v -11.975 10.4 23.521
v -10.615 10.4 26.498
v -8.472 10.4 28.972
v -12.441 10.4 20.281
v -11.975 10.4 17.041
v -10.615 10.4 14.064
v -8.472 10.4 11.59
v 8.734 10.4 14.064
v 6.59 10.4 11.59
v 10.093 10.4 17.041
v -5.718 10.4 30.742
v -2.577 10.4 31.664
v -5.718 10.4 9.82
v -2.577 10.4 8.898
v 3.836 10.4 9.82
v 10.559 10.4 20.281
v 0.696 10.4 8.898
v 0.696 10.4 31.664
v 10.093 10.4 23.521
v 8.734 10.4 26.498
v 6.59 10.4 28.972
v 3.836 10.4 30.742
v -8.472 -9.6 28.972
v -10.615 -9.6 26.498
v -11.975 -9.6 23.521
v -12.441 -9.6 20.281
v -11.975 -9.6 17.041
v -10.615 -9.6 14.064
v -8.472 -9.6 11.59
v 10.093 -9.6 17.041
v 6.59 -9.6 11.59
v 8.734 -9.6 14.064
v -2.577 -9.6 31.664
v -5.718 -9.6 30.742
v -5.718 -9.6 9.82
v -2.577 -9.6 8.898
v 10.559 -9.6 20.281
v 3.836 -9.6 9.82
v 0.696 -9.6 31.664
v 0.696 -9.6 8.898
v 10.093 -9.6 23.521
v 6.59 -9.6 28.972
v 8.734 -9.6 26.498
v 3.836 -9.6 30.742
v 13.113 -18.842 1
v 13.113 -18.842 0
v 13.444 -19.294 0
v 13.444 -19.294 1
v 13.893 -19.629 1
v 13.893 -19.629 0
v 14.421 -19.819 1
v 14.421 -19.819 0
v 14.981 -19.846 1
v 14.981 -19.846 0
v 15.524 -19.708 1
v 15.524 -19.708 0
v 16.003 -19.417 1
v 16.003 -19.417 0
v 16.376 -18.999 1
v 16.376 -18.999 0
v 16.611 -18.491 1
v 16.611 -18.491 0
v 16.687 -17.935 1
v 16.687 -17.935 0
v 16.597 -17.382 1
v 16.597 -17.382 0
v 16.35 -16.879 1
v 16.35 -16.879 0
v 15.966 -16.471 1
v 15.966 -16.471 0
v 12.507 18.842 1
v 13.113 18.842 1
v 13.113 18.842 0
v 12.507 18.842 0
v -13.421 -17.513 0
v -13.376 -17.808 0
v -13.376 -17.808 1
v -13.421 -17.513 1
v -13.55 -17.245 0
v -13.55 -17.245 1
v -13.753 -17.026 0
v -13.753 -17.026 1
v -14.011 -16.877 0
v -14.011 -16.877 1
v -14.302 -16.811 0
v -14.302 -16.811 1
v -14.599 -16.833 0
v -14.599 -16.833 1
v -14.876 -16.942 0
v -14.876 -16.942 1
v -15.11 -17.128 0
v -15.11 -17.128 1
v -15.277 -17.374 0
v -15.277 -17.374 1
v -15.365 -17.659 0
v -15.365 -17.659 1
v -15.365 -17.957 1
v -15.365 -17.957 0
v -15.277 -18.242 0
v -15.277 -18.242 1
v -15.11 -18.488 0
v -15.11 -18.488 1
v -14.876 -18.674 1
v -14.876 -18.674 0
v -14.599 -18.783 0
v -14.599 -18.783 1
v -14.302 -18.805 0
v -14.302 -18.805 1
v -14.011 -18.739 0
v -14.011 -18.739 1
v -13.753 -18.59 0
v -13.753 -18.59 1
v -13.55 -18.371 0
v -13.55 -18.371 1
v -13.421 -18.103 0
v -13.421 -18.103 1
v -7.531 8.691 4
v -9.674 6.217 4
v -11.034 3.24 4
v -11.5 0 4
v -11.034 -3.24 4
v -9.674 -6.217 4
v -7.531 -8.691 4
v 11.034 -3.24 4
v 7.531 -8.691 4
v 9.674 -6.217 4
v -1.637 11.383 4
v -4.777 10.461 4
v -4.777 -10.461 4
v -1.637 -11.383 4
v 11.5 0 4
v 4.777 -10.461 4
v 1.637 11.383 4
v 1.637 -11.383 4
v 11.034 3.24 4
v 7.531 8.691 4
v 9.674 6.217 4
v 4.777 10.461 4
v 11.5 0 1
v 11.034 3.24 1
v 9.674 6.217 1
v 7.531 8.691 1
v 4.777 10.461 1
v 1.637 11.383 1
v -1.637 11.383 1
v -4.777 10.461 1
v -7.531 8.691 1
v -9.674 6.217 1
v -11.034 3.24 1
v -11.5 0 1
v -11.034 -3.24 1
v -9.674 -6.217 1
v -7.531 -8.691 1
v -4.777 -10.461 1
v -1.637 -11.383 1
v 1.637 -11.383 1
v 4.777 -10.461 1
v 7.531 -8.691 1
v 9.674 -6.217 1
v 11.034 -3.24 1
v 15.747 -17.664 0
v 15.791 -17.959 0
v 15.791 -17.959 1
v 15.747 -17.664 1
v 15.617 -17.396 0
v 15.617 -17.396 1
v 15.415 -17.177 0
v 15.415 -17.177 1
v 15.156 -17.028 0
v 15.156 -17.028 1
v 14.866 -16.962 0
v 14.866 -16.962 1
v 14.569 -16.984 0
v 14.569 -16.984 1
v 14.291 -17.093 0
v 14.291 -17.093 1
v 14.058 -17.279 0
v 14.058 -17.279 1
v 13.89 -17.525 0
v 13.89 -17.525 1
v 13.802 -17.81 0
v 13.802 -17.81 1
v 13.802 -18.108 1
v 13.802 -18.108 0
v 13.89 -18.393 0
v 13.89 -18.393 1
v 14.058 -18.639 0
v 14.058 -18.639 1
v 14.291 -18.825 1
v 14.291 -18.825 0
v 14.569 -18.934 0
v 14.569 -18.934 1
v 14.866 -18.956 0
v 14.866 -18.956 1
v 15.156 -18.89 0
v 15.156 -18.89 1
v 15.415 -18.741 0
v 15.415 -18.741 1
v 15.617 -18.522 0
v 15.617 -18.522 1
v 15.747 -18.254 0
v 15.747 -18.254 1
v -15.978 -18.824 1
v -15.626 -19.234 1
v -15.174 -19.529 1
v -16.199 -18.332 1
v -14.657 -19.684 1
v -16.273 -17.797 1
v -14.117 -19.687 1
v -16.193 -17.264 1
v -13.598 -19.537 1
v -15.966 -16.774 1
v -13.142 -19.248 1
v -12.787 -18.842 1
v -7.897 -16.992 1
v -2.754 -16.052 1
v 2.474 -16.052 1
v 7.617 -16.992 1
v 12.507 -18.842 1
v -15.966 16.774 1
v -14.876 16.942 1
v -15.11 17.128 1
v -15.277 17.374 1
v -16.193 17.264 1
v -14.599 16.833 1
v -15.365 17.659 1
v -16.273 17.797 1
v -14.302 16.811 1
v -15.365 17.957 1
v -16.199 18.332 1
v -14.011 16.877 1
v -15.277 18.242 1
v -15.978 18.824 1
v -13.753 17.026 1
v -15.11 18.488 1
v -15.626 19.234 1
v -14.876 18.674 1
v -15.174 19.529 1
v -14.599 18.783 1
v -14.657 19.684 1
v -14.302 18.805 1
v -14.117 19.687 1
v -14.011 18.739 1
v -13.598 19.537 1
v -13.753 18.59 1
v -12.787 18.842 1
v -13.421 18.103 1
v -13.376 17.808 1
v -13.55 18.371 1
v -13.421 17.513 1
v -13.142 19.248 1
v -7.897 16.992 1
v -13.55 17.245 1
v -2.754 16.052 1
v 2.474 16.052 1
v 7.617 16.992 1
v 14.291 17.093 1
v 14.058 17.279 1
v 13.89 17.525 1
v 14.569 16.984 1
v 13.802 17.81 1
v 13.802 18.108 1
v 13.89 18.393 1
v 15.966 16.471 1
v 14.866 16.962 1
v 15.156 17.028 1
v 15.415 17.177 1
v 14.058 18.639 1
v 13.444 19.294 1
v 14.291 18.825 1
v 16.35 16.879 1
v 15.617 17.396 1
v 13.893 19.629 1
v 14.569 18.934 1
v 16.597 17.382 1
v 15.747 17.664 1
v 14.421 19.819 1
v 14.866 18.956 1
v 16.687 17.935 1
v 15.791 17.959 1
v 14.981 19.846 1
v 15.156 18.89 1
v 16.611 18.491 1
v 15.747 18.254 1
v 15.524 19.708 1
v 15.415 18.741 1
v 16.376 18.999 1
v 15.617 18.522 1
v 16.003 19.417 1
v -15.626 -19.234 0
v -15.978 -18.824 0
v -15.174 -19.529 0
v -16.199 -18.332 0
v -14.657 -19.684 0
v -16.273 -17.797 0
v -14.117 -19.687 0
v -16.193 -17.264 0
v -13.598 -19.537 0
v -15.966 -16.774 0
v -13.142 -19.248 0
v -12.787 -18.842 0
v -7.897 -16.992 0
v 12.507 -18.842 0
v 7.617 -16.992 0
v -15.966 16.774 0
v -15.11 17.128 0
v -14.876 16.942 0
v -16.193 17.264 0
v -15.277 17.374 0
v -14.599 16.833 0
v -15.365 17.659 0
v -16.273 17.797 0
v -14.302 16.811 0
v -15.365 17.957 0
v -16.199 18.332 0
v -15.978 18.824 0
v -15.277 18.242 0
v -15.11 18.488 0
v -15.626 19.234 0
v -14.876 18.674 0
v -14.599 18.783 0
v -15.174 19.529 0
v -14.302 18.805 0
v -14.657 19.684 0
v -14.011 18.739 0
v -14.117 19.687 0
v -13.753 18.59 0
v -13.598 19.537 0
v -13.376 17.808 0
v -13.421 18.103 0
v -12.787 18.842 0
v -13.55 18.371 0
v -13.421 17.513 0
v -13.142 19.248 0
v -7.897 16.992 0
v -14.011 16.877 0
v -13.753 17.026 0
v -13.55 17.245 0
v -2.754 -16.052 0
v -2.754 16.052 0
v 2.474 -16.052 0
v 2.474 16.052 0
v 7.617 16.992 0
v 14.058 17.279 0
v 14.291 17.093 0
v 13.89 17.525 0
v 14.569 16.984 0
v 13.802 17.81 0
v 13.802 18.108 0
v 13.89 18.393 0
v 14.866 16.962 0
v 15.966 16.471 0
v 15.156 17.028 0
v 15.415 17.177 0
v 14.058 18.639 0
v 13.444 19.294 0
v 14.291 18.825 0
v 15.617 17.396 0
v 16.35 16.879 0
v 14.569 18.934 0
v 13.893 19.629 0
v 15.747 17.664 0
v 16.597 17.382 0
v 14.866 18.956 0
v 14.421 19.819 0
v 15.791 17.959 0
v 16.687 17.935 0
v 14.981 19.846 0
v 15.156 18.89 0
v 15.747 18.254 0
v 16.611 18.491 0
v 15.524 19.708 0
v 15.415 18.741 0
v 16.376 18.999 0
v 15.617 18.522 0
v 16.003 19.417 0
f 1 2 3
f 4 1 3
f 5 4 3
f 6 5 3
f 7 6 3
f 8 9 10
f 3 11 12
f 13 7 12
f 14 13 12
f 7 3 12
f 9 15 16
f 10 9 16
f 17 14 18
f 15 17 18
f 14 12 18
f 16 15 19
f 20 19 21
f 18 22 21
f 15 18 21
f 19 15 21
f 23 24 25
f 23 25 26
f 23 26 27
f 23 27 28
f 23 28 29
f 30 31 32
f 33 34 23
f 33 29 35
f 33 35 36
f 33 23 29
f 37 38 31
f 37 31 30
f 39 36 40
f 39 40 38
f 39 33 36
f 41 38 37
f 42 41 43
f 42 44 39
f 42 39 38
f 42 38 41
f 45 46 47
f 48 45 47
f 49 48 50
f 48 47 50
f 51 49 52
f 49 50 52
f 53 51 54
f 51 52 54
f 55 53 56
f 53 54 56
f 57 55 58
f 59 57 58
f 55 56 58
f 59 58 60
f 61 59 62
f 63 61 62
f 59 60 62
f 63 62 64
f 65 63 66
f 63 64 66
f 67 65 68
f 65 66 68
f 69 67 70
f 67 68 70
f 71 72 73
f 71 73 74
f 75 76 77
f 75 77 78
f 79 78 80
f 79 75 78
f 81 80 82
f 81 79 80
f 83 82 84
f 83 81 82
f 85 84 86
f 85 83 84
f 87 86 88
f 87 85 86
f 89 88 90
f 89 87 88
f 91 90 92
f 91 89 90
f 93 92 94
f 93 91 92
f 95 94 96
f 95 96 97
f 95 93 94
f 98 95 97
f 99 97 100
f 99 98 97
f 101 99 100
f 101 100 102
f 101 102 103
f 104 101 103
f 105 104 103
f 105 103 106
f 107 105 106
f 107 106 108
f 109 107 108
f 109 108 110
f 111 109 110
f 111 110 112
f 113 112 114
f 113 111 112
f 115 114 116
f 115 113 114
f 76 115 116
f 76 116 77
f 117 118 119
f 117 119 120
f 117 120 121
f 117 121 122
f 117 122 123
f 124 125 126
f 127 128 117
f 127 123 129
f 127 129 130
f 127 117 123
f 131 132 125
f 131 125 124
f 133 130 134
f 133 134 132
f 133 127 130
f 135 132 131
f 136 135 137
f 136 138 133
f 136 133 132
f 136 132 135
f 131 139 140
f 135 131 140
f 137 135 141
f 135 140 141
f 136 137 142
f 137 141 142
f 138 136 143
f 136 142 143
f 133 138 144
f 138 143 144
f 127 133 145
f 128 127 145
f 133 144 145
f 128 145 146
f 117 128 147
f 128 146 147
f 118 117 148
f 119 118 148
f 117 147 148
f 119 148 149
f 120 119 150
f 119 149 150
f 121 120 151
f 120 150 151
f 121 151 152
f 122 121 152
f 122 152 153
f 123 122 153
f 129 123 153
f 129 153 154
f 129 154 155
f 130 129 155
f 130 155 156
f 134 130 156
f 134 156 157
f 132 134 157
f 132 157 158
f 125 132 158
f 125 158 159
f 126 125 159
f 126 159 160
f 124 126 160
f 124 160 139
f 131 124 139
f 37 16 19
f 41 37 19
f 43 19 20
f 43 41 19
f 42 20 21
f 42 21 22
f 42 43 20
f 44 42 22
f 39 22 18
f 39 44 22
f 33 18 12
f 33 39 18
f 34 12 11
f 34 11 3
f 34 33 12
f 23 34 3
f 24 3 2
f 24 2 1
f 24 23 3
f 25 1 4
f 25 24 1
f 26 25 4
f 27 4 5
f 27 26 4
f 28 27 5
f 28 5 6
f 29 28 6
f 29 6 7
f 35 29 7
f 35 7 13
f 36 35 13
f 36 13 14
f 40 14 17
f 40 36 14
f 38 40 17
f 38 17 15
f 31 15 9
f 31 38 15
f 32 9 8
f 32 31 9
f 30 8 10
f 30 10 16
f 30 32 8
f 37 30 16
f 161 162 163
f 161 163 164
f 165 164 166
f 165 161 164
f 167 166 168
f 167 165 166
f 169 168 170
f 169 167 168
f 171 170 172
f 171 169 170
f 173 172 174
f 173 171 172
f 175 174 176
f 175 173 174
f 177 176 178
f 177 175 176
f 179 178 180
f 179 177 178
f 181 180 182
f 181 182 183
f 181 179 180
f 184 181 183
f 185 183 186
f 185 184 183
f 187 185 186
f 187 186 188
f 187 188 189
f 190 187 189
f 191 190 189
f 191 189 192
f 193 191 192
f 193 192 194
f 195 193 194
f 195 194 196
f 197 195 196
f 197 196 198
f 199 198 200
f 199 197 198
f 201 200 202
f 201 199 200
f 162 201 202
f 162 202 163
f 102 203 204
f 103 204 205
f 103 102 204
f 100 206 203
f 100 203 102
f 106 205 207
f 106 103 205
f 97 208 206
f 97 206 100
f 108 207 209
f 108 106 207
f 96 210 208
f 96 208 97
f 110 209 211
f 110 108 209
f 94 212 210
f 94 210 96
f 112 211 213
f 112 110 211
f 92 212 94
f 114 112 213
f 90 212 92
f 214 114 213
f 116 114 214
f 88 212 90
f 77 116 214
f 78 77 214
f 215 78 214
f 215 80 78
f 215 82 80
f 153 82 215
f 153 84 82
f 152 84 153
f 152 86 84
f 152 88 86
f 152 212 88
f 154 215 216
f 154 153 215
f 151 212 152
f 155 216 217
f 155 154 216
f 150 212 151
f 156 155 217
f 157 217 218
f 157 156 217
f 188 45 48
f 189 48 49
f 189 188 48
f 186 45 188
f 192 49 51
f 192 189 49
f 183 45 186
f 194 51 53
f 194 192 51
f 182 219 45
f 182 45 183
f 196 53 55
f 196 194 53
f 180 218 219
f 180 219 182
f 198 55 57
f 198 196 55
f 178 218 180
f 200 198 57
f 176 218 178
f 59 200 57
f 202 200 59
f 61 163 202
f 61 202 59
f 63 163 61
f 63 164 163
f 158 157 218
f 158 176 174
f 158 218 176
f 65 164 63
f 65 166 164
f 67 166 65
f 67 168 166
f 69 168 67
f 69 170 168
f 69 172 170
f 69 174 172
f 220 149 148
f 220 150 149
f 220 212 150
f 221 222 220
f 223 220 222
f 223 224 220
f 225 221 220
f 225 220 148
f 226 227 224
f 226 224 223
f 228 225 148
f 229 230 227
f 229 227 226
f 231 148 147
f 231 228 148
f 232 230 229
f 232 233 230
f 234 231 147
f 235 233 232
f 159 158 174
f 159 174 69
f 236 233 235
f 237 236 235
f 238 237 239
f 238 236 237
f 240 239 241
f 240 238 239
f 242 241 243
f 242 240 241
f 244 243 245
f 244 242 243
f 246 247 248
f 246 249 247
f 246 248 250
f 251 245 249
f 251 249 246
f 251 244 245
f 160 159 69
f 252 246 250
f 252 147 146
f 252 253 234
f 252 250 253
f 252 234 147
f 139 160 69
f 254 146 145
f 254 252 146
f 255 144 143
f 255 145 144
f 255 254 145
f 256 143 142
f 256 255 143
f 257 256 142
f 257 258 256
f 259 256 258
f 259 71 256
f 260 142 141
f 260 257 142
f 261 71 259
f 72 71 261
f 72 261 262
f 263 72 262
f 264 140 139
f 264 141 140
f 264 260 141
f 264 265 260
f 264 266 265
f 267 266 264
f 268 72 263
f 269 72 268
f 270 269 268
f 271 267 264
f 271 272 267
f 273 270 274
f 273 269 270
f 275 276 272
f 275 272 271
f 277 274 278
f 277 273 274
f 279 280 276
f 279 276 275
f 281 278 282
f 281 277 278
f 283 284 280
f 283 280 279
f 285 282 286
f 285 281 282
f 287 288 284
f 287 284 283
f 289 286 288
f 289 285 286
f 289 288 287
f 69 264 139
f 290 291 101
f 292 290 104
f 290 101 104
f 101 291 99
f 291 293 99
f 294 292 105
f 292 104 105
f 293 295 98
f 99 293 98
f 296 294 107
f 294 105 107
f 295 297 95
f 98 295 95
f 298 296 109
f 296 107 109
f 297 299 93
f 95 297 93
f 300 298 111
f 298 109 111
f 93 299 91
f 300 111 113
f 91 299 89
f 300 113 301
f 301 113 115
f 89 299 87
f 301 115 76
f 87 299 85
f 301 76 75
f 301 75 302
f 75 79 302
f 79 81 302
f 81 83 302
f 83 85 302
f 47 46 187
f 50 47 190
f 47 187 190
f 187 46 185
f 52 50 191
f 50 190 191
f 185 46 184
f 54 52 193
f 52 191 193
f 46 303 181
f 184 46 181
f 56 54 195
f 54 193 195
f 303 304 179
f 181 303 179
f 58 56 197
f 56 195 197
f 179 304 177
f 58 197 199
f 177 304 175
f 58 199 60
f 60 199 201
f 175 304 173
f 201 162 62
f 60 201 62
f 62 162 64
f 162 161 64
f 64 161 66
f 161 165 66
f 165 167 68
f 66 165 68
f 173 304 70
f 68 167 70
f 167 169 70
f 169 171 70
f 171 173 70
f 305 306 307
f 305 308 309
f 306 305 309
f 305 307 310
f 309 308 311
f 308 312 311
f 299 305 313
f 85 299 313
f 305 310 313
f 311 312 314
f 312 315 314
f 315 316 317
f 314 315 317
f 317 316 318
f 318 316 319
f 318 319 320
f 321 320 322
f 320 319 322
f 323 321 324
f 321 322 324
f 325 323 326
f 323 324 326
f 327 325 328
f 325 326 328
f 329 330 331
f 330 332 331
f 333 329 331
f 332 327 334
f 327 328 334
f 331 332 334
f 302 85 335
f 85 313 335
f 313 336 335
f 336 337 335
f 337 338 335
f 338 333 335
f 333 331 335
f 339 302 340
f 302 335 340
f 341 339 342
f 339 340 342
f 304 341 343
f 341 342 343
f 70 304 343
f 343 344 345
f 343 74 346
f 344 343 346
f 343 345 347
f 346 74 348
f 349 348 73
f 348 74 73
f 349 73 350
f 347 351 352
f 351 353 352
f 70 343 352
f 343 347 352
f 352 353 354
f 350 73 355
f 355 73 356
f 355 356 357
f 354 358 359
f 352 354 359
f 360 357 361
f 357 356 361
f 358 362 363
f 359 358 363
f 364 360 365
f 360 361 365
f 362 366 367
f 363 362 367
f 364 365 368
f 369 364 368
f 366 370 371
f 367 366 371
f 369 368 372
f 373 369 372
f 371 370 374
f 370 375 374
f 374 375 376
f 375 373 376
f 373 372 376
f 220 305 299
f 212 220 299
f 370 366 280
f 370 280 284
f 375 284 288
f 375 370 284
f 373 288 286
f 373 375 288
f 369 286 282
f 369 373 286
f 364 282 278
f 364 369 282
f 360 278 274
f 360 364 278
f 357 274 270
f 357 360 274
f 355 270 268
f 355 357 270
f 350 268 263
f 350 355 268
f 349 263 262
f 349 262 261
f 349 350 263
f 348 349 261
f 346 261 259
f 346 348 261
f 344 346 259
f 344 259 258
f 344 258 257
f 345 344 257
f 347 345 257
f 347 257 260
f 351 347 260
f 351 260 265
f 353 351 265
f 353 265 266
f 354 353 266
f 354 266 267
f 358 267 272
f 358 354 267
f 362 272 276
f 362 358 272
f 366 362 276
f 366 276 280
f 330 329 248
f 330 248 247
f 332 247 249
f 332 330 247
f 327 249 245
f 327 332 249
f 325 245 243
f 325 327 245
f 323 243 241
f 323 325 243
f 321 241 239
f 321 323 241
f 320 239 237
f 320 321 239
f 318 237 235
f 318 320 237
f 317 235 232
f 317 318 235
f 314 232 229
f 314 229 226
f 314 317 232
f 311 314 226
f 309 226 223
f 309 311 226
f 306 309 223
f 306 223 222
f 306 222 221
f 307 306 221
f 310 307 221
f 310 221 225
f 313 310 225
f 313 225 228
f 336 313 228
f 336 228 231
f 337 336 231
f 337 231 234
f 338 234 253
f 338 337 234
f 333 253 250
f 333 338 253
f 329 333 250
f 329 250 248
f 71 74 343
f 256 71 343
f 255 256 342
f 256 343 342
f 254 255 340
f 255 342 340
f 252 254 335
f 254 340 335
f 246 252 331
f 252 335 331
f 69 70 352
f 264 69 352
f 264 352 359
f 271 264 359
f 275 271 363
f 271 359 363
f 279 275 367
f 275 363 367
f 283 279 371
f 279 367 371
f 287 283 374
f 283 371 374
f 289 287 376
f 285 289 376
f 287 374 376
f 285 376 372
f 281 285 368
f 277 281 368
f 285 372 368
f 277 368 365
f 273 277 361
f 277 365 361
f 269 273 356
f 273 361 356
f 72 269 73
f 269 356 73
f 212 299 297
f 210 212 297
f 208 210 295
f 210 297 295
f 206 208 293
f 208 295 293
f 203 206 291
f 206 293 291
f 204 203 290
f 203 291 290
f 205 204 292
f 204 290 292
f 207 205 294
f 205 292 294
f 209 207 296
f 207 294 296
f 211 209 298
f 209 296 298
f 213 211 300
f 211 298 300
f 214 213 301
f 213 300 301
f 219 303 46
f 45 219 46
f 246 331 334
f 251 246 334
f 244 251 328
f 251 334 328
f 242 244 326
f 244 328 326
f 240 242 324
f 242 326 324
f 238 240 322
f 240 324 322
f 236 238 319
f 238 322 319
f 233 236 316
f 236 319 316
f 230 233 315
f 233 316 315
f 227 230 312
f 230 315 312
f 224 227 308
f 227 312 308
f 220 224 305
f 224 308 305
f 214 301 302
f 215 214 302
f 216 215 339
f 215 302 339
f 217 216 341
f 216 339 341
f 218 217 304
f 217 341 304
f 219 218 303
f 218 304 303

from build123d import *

# Parameters (mm, degrees)
F0_R     = 1
F0_R_2   = 11.5
F1_DEPTH = 1
F2_DEPTH = 4
F7_START = -2
F6_R     = 11.5
F7_DEPTH = 20


# Not quite as in the source:
# - the program builds the solid bodies; features that only make, move or delete a surface that nothing else refers to are left out


with BuildPart() as f1:
    # F0 (on Top) → F1 (new body)
    with BuildSketch(Plane.XY):
        with BuildLine():
            ThreePointArc((-12.7867098571, -18.8420887816), (-0.1397777075, -15.9334011427), (12.507154442, -18.8420887816))
            Line((12.507154442, -18.8420887816), (13.112995763, -18.8420887816))
            ThreePointArc((13.112995763, -18.8420887816), (16.0030328943, -19.4174459822), (15.9661910202, -16.4709237602))
            Line((15.9661910202, -16.4709237602), (15.9661910202, 16.4709237602))
            ThreePointArc((15.9661910202, 16.4709237602), (16.0030328943, 19.4174459822), (13.112995763, 18.8420887816))
            Line((13.112995763, 18.8420887816), (12.507154442, 18.8420887816))
            ThreePointArc((12.507154442, 18.8420887816), (-0.1397777075, 15.9334011427), (-12.7867098571, 18.8420887816))
            ThreePointArc((-12.7867098571, 18.8420887816), (-15.41057285, 19.3977069518), (-15.9661910202, 16.7738439589))
            Line((-15.9661910202, 16.7738439589), (-15.9661910202, -16.7738439589))
            ThreePointArc((-15.9661910202, -16.7738439589), (-15.41057285, -19.3977069518), (-12.7867098571, -18.8420887816))
        make_face()
        with Locations((-14.3764504387, -17.8079663703)):
            Circle(F0_R, mode=Mode.SUBTRACT)
        with Locations((14.791072625, -17.9591083038)):
            Circle(F0_R, mode=Mode.SUBTRACT)
        Circle(F0_R_2, mode=Mode.SUBTRACT)
        with Locations((-14.3764504387, 17.8079663703)):
            Circle(F0_R, mode=Mode.SUBTRACT)
        with Locations((14.791072625, 17.9591083038)):
            Circle(F0_R, mode=Mode.SUBTRACT)
    extrude(amount=F1_DEPTH)

    # F0 (on Top) → F2 (join)
    with BuildSketch(Plane.XY):
        Circle(F0_R_2)
    extrude(amount=F2_DEPTH)


with BuildPart() as f7:
    # F6 (on offset) → F7 (new body)
    with BuildSketch(Plane.XZ.offset(11.6).offset(F7_START)):
        with Locations((-0.9408069891, 20.2809050679)):
            Circle(F6_R)
    extrude(amount=-F7_DEPTH)


solid = Compound([f1.part, f7.part])
